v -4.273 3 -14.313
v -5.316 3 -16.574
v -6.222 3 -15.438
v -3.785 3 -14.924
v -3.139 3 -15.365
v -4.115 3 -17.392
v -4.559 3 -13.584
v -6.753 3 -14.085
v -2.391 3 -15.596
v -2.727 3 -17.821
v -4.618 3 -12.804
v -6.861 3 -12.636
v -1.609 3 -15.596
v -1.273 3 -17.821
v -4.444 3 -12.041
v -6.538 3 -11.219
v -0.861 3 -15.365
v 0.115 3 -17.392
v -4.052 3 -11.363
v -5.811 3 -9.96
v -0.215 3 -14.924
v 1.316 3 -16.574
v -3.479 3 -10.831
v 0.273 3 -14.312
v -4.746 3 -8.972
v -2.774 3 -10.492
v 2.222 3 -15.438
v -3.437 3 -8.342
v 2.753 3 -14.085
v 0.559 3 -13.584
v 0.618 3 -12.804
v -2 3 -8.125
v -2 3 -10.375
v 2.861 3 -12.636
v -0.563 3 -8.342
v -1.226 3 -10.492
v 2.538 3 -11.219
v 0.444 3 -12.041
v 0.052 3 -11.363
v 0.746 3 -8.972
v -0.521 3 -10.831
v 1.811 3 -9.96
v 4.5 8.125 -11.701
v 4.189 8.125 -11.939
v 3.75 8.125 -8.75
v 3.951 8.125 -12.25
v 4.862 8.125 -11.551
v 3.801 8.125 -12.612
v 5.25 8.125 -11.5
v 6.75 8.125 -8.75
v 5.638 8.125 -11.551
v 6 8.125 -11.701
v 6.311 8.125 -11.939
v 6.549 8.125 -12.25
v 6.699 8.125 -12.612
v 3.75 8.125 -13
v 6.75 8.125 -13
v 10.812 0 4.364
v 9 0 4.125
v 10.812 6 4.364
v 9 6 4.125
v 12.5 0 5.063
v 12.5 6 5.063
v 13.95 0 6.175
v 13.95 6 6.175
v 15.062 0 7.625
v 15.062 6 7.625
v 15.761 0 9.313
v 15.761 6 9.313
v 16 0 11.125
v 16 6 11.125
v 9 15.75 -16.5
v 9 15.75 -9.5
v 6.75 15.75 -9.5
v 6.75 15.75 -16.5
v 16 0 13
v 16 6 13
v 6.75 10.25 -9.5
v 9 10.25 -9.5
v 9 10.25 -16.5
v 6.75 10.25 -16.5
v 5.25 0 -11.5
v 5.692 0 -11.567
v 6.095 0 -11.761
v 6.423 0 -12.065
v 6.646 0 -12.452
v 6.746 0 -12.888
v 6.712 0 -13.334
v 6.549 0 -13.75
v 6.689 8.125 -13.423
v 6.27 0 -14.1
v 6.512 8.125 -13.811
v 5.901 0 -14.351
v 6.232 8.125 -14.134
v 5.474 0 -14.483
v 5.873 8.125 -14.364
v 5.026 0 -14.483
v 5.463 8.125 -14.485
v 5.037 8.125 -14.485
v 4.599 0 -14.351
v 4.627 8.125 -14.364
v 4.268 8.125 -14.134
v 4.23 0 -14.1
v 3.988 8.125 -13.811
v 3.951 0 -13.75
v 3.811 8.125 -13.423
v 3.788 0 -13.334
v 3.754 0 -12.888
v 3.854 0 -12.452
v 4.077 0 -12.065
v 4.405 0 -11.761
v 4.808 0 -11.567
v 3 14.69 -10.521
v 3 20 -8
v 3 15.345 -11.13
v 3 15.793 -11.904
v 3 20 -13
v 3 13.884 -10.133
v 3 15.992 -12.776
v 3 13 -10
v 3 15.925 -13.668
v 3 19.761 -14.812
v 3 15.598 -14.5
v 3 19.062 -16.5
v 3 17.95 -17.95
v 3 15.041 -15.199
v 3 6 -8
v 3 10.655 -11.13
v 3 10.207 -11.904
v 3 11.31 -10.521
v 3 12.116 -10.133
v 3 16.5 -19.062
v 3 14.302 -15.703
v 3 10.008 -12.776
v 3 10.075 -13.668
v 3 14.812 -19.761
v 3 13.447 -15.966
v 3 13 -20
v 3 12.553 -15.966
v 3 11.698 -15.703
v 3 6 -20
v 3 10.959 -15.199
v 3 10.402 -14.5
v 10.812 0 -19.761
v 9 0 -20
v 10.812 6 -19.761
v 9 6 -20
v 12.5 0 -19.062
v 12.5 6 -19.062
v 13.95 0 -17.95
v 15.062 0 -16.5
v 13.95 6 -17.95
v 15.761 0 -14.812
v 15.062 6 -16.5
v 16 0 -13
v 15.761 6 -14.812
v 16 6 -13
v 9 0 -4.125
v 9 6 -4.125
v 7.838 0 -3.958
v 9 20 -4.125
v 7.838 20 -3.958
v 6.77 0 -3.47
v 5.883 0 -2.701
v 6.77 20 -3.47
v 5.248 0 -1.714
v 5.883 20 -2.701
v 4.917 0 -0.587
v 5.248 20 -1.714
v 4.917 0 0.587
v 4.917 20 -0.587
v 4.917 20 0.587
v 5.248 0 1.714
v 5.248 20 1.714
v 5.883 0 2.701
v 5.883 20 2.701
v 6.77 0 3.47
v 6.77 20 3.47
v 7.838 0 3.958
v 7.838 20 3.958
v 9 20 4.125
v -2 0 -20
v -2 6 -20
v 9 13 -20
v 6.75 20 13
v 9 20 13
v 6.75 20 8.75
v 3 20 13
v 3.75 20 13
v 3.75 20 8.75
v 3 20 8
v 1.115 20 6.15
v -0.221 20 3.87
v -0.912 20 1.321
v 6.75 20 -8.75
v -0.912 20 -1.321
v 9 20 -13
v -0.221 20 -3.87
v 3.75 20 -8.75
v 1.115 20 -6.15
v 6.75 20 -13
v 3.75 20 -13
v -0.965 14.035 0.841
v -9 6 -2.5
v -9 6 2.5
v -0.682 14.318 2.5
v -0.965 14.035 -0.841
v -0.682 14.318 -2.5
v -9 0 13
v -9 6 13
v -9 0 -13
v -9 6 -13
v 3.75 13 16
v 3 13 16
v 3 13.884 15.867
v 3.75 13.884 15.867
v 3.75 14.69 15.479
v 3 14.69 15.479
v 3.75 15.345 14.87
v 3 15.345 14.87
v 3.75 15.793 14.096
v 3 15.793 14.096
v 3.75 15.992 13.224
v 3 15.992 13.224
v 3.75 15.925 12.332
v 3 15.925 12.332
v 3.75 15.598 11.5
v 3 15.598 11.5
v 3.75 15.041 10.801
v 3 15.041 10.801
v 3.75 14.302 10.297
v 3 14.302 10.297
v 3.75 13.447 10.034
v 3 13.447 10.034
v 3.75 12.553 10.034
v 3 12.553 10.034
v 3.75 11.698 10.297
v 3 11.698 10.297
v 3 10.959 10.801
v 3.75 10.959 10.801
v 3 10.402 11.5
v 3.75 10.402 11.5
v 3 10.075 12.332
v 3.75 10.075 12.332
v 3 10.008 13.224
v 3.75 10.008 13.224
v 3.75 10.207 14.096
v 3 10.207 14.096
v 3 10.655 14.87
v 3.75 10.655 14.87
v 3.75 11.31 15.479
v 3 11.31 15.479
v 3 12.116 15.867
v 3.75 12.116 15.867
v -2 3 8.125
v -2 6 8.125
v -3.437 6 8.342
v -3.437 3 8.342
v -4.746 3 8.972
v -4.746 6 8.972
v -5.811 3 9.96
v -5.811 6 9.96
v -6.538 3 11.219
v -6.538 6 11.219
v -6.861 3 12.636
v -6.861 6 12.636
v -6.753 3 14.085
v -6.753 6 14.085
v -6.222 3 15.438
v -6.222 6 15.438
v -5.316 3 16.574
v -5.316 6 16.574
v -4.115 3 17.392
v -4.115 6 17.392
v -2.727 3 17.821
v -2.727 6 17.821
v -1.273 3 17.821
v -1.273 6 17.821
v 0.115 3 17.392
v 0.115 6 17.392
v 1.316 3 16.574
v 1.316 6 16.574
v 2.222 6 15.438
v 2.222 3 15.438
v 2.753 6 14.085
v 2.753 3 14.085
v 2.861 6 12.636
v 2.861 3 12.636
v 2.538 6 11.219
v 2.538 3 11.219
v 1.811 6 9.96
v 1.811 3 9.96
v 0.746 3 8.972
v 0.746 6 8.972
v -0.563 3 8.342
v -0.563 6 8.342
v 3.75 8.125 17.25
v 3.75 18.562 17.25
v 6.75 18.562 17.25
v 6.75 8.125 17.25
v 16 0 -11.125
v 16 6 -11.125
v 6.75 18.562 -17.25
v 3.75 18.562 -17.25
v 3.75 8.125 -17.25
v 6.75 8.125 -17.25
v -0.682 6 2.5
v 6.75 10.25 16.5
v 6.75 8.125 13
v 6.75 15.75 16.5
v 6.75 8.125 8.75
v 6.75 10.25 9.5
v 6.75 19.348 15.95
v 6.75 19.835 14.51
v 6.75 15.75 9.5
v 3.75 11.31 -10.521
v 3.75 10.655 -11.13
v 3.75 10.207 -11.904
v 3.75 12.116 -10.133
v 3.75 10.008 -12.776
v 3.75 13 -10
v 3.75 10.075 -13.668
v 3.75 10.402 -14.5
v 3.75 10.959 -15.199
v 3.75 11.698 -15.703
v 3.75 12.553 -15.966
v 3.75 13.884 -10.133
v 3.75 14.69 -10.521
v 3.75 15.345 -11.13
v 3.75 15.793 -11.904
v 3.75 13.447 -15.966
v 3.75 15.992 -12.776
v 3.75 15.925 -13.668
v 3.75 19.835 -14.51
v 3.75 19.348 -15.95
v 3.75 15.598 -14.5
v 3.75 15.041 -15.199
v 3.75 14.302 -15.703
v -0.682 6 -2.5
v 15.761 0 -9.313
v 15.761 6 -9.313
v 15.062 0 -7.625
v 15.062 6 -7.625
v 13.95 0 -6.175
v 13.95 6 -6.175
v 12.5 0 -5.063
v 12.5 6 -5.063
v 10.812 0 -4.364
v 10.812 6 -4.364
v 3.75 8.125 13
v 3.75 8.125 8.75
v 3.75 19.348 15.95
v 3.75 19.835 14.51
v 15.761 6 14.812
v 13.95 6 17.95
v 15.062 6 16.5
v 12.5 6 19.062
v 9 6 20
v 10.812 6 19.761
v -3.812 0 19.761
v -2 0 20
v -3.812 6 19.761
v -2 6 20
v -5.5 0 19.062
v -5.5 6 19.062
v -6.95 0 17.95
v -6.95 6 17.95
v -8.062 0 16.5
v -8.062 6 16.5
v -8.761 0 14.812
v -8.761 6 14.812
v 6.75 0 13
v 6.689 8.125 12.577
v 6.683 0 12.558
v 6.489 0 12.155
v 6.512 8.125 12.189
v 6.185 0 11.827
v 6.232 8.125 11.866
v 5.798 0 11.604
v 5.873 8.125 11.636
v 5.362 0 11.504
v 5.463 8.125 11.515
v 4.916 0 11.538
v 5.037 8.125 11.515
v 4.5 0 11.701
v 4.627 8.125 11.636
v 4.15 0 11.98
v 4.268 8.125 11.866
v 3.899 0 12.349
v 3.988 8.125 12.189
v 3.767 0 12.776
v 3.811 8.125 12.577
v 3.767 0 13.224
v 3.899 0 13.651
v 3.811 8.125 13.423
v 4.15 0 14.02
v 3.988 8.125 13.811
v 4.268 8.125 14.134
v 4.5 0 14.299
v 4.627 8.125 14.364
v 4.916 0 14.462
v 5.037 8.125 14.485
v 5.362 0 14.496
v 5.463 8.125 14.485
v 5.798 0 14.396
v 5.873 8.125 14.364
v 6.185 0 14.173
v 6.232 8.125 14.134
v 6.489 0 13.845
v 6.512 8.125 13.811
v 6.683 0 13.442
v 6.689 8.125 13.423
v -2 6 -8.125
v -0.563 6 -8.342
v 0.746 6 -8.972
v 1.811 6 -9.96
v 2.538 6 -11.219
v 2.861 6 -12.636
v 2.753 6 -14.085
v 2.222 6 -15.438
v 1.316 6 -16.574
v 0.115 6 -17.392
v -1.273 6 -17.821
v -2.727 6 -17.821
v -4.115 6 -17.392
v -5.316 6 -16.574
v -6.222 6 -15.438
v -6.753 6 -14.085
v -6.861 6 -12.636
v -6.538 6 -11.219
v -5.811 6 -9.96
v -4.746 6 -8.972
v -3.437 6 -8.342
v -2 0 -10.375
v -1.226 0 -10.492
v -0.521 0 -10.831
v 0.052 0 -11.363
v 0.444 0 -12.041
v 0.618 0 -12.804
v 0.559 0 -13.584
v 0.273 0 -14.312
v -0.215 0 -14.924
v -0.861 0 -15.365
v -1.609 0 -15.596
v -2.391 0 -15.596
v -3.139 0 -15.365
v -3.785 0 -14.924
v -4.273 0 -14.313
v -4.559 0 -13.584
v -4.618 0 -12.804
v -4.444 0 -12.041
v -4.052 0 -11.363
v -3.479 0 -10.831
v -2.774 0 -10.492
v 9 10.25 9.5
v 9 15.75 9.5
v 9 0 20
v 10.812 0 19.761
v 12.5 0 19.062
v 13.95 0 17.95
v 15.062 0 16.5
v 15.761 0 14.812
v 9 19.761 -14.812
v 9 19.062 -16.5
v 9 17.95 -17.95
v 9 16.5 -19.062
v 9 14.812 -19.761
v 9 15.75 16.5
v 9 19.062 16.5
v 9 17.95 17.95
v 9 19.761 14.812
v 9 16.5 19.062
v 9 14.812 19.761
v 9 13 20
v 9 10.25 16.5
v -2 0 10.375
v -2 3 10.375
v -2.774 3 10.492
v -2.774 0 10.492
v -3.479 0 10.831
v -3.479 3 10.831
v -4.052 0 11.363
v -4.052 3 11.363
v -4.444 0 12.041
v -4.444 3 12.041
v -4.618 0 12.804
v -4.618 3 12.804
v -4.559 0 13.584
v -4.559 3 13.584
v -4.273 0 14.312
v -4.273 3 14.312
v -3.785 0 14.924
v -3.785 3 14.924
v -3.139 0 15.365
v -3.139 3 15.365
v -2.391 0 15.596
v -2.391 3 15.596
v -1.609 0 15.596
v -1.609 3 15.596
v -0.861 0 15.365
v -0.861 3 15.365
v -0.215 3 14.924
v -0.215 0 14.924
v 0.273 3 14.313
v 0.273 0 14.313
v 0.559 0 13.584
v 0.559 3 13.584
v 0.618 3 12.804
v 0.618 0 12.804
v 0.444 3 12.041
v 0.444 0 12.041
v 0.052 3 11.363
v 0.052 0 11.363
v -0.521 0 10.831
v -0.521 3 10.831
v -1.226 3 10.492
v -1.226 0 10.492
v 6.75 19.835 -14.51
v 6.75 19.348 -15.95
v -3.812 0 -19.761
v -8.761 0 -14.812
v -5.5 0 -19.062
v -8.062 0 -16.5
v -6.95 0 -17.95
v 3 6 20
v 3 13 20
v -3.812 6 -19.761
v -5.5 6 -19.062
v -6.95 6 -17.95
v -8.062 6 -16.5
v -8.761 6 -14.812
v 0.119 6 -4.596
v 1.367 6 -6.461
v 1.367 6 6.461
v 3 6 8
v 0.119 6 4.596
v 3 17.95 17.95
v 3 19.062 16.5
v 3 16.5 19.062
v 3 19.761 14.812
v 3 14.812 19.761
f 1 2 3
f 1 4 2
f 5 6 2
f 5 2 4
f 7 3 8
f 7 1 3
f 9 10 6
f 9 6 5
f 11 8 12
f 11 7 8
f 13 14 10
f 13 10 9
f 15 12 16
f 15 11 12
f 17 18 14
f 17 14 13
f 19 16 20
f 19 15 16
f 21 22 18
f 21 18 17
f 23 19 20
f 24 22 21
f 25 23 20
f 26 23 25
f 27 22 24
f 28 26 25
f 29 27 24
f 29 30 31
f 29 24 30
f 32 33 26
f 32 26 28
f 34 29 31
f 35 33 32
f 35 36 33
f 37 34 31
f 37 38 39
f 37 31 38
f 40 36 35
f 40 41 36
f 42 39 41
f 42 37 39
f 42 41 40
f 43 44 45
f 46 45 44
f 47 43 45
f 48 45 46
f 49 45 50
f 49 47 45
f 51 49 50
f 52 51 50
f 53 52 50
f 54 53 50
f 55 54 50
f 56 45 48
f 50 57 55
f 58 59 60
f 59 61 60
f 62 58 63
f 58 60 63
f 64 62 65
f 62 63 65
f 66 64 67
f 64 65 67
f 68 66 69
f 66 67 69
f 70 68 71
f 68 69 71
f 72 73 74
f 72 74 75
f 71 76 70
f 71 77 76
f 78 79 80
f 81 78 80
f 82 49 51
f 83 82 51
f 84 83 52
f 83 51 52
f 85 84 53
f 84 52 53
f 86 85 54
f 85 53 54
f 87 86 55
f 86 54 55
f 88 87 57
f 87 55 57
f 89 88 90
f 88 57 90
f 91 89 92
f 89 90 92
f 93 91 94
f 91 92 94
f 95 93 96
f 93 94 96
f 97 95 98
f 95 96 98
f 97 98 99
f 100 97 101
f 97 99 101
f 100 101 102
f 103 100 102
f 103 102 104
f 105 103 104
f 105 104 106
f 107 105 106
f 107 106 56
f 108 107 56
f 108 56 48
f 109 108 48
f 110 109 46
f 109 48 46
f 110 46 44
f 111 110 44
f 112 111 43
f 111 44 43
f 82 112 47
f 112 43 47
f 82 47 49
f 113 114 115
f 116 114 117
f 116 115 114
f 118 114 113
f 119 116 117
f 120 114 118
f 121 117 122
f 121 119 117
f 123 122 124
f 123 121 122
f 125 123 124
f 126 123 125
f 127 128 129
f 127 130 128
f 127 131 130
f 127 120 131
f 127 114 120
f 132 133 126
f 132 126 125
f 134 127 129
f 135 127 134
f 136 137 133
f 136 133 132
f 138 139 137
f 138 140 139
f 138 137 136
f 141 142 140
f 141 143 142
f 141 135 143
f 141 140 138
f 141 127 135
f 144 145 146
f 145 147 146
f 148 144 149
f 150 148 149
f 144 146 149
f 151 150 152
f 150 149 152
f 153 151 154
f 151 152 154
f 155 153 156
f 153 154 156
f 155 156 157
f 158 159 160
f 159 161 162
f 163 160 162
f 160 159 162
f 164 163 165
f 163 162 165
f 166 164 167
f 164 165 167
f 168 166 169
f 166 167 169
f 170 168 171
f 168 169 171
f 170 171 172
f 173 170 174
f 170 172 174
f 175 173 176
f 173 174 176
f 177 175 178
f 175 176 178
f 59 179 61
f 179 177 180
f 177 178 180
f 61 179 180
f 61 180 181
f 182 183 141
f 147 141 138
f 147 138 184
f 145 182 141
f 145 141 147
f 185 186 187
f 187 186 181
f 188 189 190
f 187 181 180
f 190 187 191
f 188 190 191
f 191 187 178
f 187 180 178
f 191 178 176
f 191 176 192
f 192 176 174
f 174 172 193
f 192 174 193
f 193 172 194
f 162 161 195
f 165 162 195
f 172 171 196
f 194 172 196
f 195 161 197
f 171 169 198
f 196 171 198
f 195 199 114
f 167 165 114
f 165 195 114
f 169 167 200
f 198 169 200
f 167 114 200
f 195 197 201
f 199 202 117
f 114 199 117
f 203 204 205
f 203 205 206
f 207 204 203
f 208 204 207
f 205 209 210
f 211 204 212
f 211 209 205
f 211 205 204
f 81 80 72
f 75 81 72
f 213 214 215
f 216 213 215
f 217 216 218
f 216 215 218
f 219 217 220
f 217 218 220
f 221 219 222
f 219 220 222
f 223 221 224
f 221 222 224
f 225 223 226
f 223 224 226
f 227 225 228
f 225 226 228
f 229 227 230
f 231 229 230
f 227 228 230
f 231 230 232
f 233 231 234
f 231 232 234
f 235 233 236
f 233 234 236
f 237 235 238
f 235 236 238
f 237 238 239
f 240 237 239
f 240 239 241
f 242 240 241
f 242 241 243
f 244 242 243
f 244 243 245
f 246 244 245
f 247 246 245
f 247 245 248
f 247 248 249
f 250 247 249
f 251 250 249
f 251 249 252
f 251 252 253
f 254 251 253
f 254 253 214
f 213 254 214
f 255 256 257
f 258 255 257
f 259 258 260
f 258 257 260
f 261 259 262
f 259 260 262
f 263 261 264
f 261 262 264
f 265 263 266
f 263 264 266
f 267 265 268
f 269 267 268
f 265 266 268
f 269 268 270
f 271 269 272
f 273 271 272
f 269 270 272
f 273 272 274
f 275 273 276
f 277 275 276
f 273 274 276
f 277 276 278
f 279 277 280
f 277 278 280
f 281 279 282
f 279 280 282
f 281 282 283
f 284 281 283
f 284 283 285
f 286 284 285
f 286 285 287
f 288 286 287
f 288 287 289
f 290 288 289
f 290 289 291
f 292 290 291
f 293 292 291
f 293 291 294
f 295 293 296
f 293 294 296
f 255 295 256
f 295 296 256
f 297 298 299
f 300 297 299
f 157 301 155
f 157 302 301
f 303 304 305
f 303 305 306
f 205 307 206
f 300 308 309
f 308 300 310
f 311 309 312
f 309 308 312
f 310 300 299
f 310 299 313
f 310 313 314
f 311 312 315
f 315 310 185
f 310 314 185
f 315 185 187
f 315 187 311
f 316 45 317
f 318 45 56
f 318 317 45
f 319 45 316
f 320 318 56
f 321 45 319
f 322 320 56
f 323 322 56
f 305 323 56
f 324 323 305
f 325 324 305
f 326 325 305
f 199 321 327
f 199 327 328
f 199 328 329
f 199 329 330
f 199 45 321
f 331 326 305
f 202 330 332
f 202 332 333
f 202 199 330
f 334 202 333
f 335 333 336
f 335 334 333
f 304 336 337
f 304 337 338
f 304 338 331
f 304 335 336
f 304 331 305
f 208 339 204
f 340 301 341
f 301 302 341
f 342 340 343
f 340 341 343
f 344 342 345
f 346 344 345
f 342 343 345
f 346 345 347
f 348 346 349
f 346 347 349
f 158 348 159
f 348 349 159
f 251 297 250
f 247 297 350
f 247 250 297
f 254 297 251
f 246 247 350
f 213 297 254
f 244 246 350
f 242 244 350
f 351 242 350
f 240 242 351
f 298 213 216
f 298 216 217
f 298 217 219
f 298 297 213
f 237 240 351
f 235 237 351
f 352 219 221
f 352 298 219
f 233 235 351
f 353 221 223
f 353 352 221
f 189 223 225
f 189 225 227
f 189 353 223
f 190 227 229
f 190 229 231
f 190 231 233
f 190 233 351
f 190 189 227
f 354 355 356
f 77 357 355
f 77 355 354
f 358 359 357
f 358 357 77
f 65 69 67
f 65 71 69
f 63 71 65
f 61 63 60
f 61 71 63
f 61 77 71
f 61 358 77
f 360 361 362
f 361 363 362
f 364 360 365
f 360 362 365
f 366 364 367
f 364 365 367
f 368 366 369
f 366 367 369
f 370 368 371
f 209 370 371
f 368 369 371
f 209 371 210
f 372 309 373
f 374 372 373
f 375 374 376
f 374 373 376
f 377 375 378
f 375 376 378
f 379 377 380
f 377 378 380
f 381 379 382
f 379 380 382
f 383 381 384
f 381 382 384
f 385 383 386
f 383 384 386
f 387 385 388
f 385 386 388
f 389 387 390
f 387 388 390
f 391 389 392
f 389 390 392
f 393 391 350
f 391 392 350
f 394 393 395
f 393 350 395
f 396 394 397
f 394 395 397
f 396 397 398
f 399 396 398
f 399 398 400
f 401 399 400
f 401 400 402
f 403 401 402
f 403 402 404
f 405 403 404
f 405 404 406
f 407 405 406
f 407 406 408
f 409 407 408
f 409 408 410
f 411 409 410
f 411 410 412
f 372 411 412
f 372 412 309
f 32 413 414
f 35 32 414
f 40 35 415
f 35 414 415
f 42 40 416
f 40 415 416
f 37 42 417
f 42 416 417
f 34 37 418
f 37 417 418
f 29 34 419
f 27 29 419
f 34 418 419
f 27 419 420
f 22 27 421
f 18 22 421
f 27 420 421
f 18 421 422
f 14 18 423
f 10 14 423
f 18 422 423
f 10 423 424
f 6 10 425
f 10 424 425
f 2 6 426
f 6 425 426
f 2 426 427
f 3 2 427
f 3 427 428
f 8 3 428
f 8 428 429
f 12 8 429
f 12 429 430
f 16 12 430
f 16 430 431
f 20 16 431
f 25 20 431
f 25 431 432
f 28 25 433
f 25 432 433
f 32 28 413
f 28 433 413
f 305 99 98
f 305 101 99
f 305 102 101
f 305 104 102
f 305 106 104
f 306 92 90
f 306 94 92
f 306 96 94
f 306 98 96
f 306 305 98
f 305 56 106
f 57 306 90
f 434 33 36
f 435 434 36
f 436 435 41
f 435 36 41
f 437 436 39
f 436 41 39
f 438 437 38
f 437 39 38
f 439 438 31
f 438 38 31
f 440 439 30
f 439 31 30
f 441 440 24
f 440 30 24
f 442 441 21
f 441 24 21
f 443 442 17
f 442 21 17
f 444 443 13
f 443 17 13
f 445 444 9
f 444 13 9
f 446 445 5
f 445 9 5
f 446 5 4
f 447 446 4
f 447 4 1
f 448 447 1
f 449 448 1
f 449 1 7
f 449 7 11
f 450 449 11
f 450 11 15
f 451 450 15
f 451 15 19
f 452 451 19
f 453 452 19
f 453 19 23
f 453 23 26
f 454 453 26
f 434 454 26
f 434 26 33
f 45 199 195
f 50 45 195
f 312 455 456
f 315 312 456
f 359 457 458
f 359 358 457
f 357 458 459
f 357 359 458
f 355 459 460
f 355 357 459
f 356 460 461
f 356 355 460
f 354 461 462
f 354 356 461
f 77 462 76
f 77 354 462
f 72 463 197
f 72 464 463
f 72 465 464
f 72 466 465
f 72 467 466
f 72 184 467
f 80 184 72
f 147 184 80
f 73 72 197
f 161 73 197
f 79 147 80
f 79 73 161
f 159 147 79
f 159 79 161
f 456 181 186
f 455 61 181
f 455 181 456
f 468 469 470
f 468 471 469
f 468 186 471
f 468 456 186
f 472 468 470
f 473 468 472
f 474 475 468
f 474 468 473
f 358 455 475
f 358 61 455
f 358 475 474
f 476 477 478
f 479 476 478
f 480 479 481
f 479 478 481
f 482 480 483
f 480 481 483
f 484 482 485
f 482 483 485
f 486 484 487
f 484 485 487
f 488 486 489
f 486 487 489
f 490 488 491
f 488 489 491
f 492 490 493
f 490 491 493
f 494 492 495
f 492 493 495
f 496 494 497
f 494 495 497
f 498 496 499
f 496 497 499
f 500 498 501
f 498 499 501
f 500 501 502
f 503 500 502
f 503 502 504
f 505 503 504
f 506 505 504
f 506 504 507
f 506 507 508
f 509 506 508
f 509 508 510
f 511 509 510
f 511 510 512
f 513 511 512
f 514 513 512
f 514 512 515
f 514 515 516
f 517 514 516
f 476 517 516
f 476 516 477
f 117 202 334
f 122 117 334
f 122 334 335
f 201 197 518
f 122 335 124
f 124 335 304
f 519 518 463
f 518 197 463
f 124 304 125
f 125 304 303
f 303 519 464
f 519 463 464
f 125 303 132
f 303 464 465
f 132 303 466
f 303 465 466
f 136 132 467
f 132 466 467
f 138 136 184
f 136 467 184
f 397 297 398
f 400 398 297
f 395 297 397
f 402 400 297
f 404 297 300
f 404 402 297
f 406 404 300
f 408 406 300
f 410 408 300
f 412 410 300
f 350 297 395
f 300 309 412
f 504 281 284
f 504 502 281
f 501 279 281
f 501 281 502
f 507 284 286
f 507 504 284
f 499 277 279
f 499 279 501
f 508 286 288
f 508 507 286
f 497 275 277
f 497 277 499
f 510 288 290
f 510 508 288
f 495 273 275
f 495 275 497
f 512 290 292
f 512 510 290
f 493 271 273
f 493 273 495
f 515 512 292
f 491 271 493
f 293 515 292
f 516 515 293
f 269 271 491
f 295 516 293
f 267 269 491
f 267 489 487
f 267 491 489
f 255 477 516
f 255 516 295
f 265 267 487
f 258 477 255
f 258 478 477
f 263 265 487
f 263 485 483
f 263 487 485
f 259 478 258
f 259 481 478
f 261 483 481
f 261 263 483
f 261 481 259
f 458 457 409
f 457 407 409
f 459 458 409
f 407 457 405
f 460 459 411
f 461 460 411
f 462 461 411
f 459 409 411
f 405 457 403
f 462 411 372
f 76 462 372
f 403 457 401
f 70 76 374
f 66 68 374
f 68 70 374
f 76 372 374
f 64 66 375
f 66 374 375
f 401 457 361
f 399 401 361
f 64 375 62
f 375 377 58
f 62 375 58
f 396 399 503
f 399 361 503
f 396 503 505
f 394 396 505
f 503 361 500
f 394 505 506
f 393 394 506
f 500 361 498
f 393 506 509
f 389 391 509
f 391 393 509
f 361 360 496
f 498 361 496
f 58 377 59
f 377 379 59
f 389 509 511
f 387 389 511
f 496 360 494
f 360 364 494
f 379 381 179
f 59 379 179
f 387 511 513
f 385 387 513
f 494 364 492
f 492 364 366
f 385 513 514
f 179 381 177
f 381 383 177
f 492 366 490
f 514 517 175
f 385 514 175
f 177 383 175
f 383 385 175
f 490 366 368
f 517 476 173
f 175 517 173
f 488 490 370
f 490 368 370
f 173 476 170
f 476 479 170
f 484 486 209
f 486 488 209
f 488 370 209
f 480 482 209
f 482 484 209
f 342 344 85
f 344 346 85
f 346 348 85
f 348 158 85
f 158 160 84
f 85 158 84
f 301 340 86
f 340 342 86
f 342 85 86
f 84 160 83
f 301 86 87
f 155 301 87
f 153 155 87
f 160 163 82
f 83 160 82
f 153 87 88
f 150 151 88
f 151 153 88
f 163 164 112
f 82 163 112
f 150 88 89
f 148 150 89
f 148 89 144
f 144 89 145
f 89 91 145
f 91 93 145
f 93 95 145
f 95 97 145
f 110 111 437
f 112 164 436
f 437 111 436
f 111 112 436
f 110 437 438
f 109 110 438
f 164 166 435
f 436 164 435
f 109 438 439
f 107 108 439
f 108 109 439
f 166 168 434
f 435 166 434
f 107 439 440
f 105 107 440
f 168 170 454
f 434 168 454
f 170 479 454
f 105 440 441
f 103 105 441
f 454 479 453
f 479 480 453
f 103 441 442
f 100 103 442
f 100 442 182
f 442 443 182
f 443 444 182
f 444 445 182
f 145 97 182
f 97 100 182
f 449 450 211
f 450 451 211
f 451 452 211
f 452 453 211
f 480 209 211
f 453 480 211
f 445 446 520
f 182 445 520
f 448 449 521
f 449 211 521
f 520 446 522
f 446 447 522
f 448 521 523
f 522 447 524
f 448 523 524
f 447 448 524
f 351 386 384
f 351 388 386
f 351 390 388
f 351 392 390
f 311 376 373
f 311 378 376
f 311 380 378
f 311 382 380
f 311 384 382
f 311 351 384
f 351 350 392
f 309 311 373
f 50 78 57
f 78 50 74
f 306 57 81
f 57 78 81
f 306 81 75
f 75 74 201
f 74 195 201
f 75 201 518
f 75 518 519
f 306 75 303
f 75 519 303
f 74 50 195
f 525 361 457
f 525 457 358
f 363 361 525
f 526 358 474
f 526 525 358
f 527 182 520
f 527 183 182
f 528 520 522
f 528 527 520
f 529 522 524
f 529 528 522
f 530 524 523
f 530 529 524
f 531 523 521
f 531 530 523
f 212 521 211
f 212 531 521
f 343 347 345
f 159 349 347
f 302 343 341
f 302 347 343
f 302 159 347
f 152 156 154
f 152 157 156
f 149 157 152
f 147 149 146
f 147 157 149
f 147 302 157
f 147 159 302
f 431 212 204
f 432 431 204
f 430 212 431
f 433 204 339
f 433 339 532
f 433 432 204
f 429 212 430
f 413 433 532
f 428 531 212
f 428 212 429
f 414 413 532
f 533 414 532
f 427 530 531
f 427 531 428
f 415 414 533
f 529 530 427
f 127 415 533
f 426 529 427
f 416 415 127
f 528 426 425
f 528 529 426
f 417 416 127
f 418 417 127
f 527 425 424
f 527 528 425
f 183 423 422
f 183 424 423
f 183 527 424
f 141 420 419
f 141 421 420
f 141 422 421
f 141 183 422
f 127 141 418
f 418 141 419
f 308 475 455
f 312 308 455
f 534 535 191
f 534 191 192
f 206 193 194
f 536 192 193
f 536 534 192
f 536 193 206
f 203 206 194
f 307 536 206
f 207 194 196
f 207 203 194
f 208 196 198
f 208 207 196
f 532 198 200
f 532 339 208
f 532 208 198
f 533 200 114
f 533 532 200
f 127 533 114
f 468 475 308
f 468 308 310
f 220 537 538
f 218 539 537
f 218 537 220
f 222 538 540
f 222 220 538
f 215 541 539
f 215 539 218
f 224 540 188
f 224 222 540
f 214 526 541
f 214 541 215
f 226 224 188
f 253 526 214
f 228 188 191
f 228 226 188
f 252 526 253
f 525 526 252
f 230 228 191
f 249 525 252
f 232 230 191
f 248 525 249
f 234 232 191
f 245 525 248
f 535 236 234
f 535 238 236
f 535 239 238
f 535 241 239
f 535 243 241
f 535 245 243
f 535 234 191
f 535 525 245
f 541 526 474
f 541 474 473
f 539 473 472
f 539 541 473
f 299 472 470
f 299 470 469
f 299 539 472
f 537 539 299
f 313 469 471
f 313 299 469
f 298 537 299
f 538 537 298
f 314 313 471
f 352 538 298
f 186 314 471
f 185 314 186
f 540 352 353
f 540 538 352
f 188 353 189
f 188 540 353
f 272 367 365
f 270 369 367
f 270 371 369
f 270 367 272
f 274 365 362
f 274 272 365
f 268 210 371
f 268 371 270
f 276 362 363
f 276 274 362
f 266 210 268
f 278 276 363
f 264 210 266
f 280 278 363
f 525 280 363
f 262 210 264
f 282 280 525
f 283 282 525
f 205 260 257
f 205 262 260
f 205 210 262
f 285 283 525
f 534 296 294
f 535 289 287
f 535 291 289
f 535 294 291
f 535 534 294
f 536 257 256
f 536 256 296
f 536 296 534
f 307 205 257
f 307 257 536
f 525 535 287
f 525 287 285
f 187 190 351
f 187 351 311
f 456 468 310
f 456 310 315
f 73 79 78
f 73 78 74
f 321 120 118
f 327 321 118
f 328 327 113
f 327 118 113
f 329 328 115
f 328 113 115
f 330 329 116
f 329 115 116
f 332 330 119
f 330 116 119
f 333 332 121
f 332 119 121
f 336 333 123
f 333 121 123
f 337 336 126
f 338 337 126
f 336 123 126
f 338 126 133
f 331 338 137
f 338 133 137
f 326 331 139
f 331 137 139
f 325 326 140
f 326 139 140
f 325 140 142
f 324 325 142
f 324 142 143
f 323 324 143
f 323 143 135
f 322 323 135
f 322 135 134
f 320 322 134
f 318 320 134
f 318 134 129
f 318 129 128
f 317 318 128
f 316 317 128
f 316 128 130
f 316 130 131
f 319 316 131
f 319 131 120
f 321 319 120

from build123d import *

# Parameters (mm, degrees)
SKETCH1_W                = 18
SKETCH1_H                = 40
BOSS_EXTRUDE1_DEPTH      = 6
BOSS_EXTRUDE2_DEPTH      = 14
SKETCH3_R                = 4.125
CUT_EXTRUDE1_DEPTH       = 30.681644159
FILLET1_R                = 7
SKETCH12_W               = 3
SKETCH12_H               = 8.5
CUT_EXTRUDE7_DEPTH       = 11.875
SKETCH13_R               = 1.5
CUT_EXTRUDE8_DEPTH       = 25.940241077
CUT_EXTRUDE9_REACH       = 32.725
SKETCH14_R               = 3
CUT_EXTRUDE10_REACH      = 35.526
SKETCH15_W               = 7
SKETCH15_H               = 5.5
SKETCH7_W                = 15.875
SKETCH7_H                = 6
BOSS_EXTRUDE3_DEPTH      = 7
FILLET2_R                = 7
SKETCH8_R                = 2.625
CUT_EXTRUDE4_DEPTH       = 30.189039039
BOSS_EXTRUDE4_DEPTH      = 2.5
BOSS_EXTRUDE4_DEPTH_BACK = 2.5
SKETCH10_R               = 4.875
CUT_EXTRUDE5_DEPTH       = 3


with BuildPart() as part:
    # Sketch1 → Boss-Extrude1 (new body)
    with BuildSketch(Plane(origin=(0, 0, 0), x_dir=(1, 0, 0), z_dir=(0, 1, 0))):
        Rectangle(SKETCH1_W, SKETCH1_H)
    extrude(amount=BOSS_EXTRUDE1_DEPTH)

    # Sketch2 → Boss-Extrude2 (add)
    with BuildSketch(Plane(origin=(0, 6, 0), x_dir=(1, 0, 0), z_dir=(0, 1, 0))):
        with BuildLine():
            Line((3, -20), (3, -8))
            ThreePointArc((3, -8), (-1, 0), (3, 8))
            Line((3, 8), (3, 20))
            Line((3, 20), (9, 20))
            Line((9, 20), (9, -20))
            Line((9, -20), (3, -20))
        make_face()
    extrude(amount=BOSS_EXTRUDE2_DEPTH)

    # Sketch3 → Cut-Extrude1 (cut, through all)
    with BuildSketch(Plane(origin=(0, 20, 0), x_dir=(1, 0, 0), z_dir=(0, 1, 0))):
        with Locations((9, 0)):
            Circle(SKETCH3_R)
    extrude(amount=-CUT_EXTRUDE1_DEPTH, mode=Mode.SUBTRACT)

    # Fillet1
    fillet1_edges = [part.edges().sort_by_distance(p)[0] for p in [
        (6, 20, 20),
        (6, 20, -20),
    ]]
    fillet(fillet1_edges, radius=FILLET1_R)

    # Sketch12 → Cut-Extrude7 (cut)
    with BuildSketch(Plane(origin=(0, 20, 0), x_dir=(1, 0, 0), z_dir=(0, 1, 0))):
        with Locations((5.25, 13)):
            Rectangle(SKETCH12_W, SKETCH12_H)
        with Locations((5.25, -13)):
            Rectangle(SKETCH12_W, SKETCH12_H)
    extrude(amount=-CUT_EXTRUDE7_DEPTH, mode=Mode.SUBTRACT)

    # Sketch13 → Cut-Extrude8 (cut, through all)
    with BuildSketch(Plane(origin=(0, 8.125, 0), x_dir=(1, 0, 0), z_dir=(0, 1, 0))):
        with Locations(Location((5.25, 13, 0), (0, 0, 270))):
            Circle(SKETCH13_R)
        with Locations((5.25, -13)):
            Circle(SKETCH13_R)
    extrude(amount=-CUT_EXTRUDE8_DEPTH, mode=Mode.SUBTRACT)

    # Sketch14 → Cut-Extrude9 (cut, up to next)
    with BuildSketch(Plane.ZY.offset(-3), mode=Mode.PRIVATE) as cut_extrude9_sk1:
        with Locations((-13, 13)):
            Circle(SKETCH14_R)
    cut_extrude9_tool1 = extrude(cut_extrude9_sk1.sketch, amount=-CUT_EXTRUDE9_REACH, mode=Mode.PRIVATE) & part.part
    # Sketch14 → Cut-Extrude9 (cut, up to next)
    with BuildSketch(Plane.ZY.offset(-3), mode=Mode.PRIVATE) as cut_extrude9_sk2:
        with Locations((13, 13)):
            Circle(SKETCH14_R)
    cut_extrude9_tool2 = extrude(cut_extrude9_sk2.sketch, amount=-CUT_EXTRUDE9_REACH, mode=Mode.PRIVATE) & part.part
    add(cut_extrude9_tool1.solids().sort_by_distance((3, 13, -13))[0], mode=Mode.SUBTRACT)
    add(cut_extrude9_tool2.solids().sort_by_distance((3, 13, 13))[0], mode=Mode.SUBTRACT)

    # Sketch15 → Cut-Extrude10 (cut, up to next)
    with BuildSketch(Plane(origin=(9, 0, 0), x_dir=(0, 0, -1), z_dir=(1, 0, 0)), mode=Mode.PRIVATE) as cut_extrude10_sk1:
        with Locations((13, 13)):
            Rectangle(SKETCH15_W, SKETCH15_H)
    cut_extrude10_tool1 = extrude(cut_extrude10_sk1.sketch, amount=-CUT_EXTRUDE10_REACH, mode=Mode.PRIVATE) & part.part
    # Sketch15 → Cut-Extrude10 (cut, up to next)
    with BuildSketch(Plane(origin=(9, 0, 0), x_dir=(0, 0, -1), z_dir=(1, 0, 0)), mode=Mode.PRIVATE) as cut_extrude10_sk2:
        with Locations((-13, 13)):
            Rectangle(SKETCH15_W, SKETCH15_H)
    cut_extrude10_tool2 = extrude(cut_extrude10_sk2.sketch, amount=-CUT_EXTRUDE10_REACH, mode=Mode.PRIVATE) & part.part
    add(cut_extrude10_tool1.solids().sort_by_distance((9, 13, -13))[0], mode=Mode.SUBTRACT)
    add(cut_extrude10_tool2.solids().sort_by_distance((9, 13, 13))[0], mode=Mode.SUBTRACT)

    # Sketch7 → Boss-Extrude3 (add)
    with BuildSketch(Plane(origin=(9, 0, 0), x_dir=(0, 0, -1), z_dir=(1, 0, 0))):
        with Locations((-12.0625, 3)):
            Rectangle(SKETCH7_W, SKETCH7_H)
        with Locations((12.0625, 3)):
            Rectangle(SKETCH7_W, SKETCH7_H)
    extrude(amount=BOSS_EXTRUDE3_DEPTH)

    # Fillet2
    fillet2_edges = [part.edges().sort_by_distance(p)[0] for p in [
        (-9, 3, -20),
        (16, 3, -20),
        (16, 3, 20),
        (-9, 3, 20),
        (16, 3, -4.125),
        (16, 3, 4.125),
    ]]
    fillet(fillet2_edges, radius=FILLET2_R - 0.0001)  # a hair under: the kernel refuses the full size

    # Sketch8 → Cut-Extrude4 (cut, through all)
    with BuildSketch(Plane(origin=(0, 6, 0), x_dir=(1, 0, 0), z_dir=(0, 1, 0))):
        with Locations(Location((-2, 13, 0), (0, 0, 270))):
            Circle(SKETCH8_R)
        with Locations(Location((-2, -13, 0), (0, 0, 90))):
            Circle(SKETCH8_R)
    extrude(amount=-CUT_EXTRUDE4_DEPTH, mode=Mode.SUBTRACT)

    # Sketch9 → Boss-Extrude4 (add, two sides: drawn at the far end of the back side and taken through both)
    with BuildSketch(Plane.XY.offset(-BOSS_EXTRUDE4_DEPTH_BACK)):
        Polygon((-9, 6), (2, 17), (2, 6), align=None)
    extrude(amount=BOSS_EXTRUDE4_DEPTH + BOSS_EXTRUDE4_DEPTH_BACK)

    # Sketch10 → Cut-Extrude5 (cut)
    with BuildSketch(Plane(origin=(0, 6, 0), x_dir=(1, 0, 0), z_dir=(0, 1, 0))):
        with Locations(Location((-2, 13, 0), (0, 0, 270))):
            Circle(SKETCH10_R)
        with Locations(Location((-2, -13, 0), (0, 0, 90))):
            Circle(SKETCH10_R)
    extrude(amount=-CUT_EXTRUDE5_DEPTH, mode=Mode.SUBTRACT)


solid = part.part
